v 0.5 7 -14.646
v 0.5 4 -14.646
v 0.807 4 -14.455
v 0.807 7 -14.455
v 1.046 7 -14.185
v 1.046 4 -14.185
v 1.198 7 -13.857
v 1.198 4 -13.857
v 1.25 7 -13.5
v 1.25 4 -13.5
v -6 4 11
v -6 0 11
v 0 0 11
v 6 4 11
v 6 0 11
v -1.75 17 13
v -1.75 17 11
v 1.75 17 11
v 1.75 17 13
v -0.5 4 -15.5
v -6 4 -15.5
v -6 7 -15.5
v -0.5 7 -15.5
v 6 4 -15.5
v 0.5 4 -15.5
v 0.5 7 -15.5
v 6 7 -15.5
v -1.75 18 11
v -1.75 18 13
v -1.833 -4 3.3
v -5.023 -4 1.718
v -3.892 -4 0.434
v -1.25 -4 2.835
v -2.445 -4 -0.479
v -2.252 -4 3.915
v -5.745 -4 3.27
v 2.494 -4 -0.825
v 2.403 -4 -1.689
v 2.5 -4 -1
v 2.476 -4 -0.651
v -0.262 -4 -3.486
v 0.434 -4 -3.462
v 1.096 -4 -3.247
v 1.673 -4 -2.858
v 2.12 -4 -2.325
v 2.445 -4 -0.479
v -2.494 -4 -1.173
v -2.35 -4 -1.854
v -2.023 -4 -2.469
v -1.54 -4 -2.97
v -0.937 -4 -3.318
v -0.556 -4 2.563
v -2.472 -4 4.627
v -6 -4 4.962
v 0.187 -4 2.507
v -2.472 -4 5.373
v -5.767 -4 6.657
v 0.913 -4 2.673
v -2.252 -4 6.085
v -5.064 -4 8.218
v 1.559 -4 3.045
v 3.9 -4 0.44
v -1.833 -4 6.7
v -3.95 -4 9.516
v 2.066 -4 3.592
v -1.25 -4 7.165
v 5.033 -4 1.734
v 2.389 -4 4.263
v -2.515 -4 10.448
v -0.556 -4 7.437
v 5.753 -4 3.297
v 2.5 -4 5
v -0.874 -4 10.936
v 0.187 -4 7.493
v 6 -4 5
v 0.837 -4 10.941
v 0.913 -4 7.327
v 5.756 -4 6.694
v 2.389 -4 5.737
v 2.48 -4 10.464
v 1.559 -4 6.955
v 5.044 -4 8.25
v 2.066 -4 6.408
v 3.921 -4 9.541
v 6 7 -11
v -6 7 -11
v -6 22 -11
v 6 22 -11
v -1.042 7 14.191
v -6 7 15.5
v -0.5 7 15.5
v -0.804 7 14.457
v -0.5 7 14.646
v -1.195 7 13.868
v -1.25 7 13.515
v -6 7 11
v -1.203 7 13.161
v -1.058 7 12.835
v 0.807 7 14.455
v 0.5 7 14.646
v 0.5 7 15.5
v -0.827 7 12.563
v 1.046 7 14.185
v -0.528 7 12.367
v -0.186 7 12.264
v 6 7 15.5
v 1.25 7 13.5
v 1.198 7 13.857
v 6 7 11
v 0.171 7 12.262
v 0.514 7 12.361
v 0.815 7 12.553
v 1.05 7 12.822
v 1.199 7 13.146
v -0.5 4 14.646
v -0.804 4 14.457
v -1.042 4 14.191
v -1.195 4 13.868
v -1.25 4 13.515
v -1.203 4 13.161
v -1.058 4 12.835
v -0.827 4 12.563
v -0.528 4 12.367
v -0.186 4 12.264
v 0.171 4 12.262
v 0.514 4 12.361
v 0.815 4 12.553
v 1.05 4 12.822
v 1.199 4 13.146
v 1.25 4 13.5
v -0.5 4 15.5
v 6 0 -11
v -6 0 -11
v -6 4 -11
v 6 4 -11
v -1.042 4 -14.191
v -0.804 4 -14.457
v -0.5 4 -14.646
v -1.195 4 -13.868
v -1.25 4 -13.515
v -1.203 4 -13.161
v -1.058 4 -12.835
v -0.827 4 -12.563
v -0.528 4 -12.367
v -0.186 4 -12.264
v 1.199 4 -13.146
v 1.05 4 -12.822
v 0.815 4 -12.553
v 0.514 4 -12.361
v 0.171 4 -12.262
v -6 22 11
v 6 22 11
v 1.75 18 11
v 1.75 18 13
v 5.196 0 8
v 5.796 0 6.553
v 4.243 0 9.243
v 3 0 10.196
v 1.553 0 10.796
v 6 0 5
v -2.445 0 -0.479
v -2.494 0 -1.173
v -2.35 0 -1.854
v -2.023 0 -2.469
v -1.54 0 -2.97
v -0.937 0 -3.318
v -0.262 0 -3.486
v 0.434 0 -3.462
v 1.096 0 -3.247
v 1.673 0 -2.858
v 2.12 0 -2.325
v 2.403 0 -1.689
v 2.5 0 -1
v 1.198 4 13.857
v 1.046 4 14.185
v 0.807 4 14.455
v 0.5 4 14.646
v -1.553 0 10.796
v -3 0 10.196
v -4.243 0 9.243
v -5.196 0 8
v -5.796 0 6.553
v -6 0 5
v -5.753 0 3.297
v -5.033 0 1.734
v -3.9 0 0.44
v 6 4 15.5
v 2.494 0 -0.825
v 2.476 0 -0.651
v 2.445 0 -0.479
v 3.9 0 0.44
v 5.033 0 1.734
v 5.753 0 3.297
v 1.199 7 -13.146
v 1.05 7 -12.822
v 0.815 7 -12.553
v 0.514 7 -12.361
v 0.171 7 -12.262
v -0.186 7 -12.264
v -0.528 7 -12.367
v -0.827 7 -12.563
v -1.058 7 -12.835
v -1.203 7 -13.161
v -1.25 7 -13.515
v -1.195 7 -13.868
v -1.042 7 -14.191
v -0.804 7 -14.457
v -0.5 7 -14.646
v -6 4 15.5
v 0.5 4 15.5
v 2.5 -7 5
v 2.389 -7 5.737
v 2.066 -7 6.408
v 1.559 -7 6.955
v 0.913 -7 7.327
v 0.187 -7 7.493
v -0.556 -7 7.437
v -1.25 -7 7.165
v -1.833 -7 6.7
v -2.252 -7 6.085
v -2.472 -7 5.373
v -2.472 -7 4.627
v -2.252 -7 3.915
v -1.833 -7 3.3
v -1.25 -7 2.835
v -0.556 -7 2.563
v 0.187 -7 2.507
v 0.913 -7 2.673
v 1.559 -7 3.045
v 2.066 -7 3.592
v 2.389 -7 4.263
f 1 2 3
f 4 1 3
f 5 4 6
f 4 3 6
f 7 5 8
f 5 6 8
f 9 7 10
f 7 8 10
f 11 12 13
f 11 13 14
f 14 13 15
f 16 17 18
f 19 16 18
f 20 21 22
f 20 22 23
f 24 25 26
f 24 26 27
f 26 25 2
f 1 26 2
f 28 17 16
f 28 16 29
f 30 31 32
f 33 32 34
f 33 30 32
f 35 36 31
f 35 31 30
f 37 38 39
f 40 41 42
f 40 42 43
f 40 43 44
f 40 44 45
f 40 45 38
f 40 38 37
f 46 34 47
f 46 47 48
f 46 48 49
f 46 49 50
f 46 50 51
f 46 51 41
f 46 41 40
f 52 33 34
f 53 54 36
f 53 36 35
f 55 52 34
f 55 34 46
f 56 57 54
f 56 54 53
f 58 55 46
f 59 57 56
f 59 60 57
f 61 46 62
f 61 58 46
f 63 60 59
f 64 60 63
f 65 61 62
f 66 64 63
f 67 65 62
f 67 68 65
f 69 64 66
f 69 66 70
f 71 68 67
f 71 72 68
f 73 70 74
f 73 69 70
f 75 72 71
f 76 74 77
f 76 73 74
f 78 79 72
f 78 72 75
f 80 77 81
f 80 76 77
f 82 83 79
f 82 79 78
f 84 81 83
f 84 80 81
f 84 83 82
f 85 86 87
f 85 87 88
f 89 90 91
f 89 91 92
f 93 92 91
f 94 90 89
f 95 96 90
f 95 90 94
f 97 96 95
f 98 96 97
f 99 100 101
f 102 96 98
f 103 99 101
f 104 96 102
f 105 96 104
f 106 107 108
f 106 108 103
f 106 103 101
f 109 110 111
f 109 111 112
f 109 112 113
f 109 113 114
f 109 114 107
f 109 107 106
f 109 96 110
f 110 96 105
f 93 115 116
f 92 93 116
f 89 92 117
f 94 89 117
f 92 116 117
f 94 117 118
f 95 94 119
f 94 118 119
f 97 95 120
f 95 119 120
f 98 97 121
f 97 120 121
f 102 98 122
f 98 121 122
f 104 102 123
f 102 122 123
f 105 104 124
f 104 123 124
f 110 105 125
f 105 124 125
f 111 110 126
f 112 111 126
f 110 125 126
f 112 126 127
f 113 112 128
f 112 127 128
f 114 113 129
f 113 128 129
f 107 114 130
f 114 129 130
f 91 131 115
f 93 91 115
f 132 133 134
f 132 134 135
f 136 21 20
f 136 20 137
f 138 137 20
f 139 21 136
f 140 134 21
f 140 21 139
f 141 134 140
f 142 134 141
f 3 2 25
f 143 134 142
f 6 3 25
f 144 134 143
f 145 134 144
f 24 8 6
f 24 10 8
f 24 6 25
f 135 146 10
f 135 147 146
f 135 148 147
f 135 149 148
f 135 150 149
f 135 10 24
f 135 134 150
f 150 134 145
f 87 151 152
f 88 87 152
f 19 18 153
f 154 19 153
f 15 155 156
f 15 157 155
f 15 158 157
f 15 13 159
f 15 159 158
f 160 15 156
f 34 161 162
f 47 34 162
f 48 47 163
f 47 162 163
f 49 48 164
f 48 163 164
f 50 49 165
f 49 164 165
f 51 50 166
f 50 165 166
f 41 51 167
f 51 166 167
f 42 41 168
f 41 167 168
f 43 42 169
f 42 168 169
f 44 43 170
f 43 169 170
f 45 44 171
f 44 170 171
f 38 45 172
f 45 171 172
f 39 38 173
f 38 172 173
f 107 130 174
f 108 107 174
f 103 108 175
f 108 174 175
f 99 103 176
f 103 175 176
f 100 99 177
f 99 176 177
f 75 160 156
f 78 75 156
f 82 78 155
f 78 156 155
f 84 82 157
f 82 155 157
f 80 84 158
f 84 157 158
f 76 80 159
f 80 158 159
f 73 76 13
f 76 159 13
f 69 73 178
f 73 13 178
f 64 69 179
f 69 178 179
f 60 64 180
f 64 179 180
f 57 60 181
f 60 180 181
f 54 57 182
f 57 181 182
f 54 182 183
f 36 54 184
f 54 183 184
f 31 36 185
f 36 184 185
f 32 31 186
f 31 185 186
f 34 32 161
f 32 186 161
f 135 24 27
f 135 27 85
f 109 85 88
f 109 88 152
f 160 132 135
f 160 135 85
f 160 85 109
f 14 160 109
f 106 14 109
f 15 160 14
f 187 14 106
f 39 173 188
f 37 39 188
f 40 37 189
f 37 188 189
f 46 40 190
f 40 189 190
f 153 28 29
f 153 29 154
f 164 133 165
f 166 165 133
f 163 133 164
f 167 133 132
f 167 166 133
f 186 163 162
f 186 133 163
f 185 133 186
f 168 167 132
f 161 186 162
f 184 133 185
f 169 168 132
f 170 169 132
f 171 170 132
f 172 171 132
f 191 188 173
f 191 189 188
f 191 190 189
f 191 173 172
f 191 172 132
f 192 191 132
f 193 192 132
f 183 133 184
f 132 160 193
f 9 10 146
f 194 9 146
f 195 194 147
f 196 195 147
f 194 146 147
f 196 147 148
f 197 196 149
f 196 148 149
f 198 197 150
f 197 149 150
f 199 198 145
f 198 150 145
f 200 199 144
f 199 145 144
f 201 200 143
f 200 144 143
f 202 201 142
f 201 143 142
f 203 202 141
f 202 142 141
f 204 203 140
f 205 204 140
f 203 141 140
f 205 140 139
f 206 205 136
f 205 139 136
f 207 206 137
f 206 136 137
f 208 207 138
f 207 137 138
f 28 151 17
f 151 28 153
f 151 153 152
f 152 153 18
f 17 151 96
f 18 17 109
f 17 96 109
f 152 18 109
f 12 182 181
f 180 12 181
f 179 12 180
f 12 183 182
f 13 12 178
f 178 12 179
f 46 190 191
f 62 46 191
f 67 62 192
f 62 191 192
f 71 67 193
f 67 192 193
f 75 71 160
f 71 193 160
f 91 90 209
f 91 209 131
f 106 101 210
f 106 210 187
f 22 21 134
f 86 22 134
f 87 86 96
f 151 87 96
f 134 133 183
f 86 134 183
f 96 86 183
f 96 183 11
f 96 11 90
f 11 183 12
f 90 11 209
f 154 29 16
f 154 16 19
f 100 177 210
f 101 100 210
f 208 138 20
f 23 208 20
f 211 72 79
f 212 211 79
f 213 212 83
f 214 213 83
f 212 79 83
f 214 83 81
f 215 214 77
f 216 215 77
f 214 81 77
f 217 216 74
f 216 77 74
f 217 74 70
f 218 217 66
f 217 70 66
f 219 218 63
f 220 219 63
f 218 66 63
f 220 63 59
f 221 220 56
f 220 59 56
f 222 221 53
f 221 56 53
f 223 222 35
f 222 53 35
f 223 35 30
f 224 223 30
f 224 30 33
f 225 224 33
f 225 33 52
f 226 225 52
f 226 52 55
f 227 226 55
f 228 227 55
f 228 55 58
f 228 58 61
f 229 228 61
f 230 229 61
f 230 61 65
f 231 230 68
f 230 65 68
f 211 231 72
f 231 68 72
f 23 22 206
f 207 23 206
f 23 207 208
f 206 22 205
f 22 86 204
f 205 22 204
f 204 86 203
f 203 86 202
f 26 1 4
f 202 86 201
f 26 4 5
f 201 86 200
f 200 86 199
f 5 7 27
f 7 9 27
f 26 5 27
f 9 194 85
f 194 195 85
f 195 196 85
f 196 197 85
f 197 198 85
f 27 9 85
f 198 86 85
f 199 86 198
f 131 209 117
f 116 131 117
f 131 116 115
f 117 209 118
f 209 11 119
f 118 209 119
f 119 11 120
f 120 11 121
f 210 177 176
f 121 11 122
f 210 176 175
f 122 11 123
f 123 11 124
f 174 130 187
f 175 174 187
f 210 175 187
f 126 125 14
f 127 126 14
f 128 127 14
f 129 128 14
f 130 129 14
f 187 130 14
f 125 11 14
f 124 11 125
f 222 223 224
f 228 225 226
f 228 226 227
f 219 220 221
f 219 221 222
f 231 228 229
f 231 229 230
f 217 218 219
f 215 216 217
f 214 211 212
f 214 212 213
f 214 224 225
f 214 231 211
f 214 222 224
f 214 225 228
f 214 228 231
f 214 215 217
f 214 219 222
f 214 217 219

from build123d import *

# Parameters (mm, degrees)
F0_W      = 12
F0_H      = 22
F1_DEPTH  = 22
F3_DEPTH  = 4
F4_R      = 2.5
F5_DEPTH  = 3
F6_W      = 12
F6_H      = 3
F7_DEPTH  = 4.5
F8_W      = 12
F8_H      = 3
F9_DEPTH  = 4.5
F11_DEPTH = 3
F13_DEPTH = 3
F14_W     = 3.5
F14_H     = 1
F15_DEPTH = 2


with BuildPart() as f1:
    # F0 (on Front) → F1 (new body)
    with BuildSketch(Plane.XZ):
        Rectangle(F0_W, F0_H)
    extrude(amount=-F1_DEPTH)

    # F2 (on face) → F3 (join)
    with BuildSketch(Plane.XZ):
        with BuildLine():
            ThreePointArc((2.4451447071, -0.4791666667), (5.0334316447, 1.7343353083), (6, 5))
            ThreePointArc((6, 5), (-3.2656646917, 10.0334316447), (-2.4451447071, -0.4791666667))
            ThreePointArc((-2.4451447071, -0.4791666667), (0, 1.5), (2.4451447071, -0.4791666667))
        make_face()
        with BuildLine():
            ThreePointArc((2.4451447071, -0.4791666667), (0, 1.5), (-2.4451447071, -0.4791666667))
            ThreePointArc((-2.4451447071, -0.4791666667), (0, -1), (2.4451447071, -0.4791666667))
        make_face()
        with BuildLine():
            ThreePointArc((2.4451447071, -0.4791666667), (0, -1), (-2.4451447071, -0.4791666667))
            ThreePointArc((-2.4451447071, -0.4791666667), (-0.2618570527, -3.4862483552), (2.5, -1))
            ThreePointArc((2.5, -1), (2.4862483552, -0.7381429473), (2.4451447071, -0.4791666667))
        make_face()
    extrude(amount=F3_DEPTH)

    # F4 (on face) → F5 (join)
    with BuildSketch(Plane.XZ.offset(4)):
        with Locations((0, 5)):
            Circle(F4_R)
    extrude(amount=F5_DEPTH)

    # F6 (on face) → F7 (join)
    with BuildSketch(Plane.XY.offset(11)):
        with Locations((0, 5.5)):
            Rectangle(F6_W, F6_H)
    extrude(amount=F7_DEPTH)

    # F8 (on face) → F9 (join)
    with BuildSketch(Plane(origin=(0, 0, -11), x_dir=(1, 0, 0), z_dir=(0, 0, -1))):
        with Locations((0, -5.5)):
            Rectangle(F8_W, F8_H)
    extrude(amount=F9_DEPTH)

    # F10 (on face) → F11 (cut, through all)
    with BuildSketch(Plane.XZ.offset(-4)):
        with BuildLine():
            ThreePointArc((-0.5, 14.6456439237), (-0.6846531969, 12.4541749668), (1.25, 13.5))
            ThreePointArc((1.25, 13.5), (1.0458250332, 14.1846531969), (0.5, 14.6456439237))
            ThreePointArc((0.5, 14.6456439237), (0, 14.75), (-0.5, 14.6456439237))
        make_face()
        with BuildLine():
            ThreePointArc((-0.5, 14.6456439237), (0, 14.75), (0.5, 14.6456439237))
            Line((0.5, 14.6456439237), (0.5, 15.5))
            Line((0.5, 15.5), (-0.5, 15.5))
            Line((-0.5, 15.5), (-0.5, 14.6456439237))
        make_face()
    extrude(amount=-F11_DEPTH, mode=Mode.SUBTRACT)

    # F12 (on face) → F13 (cut, through all)
    with BuildSketch(Plane.XZ.offset(-4)):
        with BuildLine():
            ThreePointArc((0.5, -14.6456439237), (1.0458250332, -14.1846531969), (1.25, -13.5))
            ThreePointArc((1.25, -13.5), (-0.6846531969, -12.4541749668), (-0.5, -14.6456439237))
            ThreePointArc((-0.5, -14.6456439237), (0, -14.75), (0.5, -14.6456439237))
        make_face()
        with BuildLine():
            ThreePointArc((0.5, -14.6456439237), (0, -14.75), (-0.5, -14.6456439237))
            Line((-0.5, -14.6456439237), (-0.5, -15.5))
            Line((-0.5, -15.5), (0.5, -15.5))
            Line((0.5, -15.5), (0.5, -14.6456439237))
        make_face()
    extrude(amount=-F13_DEPTH, mode=Mode.SUBTRACT)

    # F14 (on face) → F15 (join)
    with BuildSketch(Plane.XY.offset(11)):
        with Locations((0, 17.5)):
            Rectangle(F14_W, F14_H)
    extrude(amount=F15_DEPTH)


solid = f1.part
